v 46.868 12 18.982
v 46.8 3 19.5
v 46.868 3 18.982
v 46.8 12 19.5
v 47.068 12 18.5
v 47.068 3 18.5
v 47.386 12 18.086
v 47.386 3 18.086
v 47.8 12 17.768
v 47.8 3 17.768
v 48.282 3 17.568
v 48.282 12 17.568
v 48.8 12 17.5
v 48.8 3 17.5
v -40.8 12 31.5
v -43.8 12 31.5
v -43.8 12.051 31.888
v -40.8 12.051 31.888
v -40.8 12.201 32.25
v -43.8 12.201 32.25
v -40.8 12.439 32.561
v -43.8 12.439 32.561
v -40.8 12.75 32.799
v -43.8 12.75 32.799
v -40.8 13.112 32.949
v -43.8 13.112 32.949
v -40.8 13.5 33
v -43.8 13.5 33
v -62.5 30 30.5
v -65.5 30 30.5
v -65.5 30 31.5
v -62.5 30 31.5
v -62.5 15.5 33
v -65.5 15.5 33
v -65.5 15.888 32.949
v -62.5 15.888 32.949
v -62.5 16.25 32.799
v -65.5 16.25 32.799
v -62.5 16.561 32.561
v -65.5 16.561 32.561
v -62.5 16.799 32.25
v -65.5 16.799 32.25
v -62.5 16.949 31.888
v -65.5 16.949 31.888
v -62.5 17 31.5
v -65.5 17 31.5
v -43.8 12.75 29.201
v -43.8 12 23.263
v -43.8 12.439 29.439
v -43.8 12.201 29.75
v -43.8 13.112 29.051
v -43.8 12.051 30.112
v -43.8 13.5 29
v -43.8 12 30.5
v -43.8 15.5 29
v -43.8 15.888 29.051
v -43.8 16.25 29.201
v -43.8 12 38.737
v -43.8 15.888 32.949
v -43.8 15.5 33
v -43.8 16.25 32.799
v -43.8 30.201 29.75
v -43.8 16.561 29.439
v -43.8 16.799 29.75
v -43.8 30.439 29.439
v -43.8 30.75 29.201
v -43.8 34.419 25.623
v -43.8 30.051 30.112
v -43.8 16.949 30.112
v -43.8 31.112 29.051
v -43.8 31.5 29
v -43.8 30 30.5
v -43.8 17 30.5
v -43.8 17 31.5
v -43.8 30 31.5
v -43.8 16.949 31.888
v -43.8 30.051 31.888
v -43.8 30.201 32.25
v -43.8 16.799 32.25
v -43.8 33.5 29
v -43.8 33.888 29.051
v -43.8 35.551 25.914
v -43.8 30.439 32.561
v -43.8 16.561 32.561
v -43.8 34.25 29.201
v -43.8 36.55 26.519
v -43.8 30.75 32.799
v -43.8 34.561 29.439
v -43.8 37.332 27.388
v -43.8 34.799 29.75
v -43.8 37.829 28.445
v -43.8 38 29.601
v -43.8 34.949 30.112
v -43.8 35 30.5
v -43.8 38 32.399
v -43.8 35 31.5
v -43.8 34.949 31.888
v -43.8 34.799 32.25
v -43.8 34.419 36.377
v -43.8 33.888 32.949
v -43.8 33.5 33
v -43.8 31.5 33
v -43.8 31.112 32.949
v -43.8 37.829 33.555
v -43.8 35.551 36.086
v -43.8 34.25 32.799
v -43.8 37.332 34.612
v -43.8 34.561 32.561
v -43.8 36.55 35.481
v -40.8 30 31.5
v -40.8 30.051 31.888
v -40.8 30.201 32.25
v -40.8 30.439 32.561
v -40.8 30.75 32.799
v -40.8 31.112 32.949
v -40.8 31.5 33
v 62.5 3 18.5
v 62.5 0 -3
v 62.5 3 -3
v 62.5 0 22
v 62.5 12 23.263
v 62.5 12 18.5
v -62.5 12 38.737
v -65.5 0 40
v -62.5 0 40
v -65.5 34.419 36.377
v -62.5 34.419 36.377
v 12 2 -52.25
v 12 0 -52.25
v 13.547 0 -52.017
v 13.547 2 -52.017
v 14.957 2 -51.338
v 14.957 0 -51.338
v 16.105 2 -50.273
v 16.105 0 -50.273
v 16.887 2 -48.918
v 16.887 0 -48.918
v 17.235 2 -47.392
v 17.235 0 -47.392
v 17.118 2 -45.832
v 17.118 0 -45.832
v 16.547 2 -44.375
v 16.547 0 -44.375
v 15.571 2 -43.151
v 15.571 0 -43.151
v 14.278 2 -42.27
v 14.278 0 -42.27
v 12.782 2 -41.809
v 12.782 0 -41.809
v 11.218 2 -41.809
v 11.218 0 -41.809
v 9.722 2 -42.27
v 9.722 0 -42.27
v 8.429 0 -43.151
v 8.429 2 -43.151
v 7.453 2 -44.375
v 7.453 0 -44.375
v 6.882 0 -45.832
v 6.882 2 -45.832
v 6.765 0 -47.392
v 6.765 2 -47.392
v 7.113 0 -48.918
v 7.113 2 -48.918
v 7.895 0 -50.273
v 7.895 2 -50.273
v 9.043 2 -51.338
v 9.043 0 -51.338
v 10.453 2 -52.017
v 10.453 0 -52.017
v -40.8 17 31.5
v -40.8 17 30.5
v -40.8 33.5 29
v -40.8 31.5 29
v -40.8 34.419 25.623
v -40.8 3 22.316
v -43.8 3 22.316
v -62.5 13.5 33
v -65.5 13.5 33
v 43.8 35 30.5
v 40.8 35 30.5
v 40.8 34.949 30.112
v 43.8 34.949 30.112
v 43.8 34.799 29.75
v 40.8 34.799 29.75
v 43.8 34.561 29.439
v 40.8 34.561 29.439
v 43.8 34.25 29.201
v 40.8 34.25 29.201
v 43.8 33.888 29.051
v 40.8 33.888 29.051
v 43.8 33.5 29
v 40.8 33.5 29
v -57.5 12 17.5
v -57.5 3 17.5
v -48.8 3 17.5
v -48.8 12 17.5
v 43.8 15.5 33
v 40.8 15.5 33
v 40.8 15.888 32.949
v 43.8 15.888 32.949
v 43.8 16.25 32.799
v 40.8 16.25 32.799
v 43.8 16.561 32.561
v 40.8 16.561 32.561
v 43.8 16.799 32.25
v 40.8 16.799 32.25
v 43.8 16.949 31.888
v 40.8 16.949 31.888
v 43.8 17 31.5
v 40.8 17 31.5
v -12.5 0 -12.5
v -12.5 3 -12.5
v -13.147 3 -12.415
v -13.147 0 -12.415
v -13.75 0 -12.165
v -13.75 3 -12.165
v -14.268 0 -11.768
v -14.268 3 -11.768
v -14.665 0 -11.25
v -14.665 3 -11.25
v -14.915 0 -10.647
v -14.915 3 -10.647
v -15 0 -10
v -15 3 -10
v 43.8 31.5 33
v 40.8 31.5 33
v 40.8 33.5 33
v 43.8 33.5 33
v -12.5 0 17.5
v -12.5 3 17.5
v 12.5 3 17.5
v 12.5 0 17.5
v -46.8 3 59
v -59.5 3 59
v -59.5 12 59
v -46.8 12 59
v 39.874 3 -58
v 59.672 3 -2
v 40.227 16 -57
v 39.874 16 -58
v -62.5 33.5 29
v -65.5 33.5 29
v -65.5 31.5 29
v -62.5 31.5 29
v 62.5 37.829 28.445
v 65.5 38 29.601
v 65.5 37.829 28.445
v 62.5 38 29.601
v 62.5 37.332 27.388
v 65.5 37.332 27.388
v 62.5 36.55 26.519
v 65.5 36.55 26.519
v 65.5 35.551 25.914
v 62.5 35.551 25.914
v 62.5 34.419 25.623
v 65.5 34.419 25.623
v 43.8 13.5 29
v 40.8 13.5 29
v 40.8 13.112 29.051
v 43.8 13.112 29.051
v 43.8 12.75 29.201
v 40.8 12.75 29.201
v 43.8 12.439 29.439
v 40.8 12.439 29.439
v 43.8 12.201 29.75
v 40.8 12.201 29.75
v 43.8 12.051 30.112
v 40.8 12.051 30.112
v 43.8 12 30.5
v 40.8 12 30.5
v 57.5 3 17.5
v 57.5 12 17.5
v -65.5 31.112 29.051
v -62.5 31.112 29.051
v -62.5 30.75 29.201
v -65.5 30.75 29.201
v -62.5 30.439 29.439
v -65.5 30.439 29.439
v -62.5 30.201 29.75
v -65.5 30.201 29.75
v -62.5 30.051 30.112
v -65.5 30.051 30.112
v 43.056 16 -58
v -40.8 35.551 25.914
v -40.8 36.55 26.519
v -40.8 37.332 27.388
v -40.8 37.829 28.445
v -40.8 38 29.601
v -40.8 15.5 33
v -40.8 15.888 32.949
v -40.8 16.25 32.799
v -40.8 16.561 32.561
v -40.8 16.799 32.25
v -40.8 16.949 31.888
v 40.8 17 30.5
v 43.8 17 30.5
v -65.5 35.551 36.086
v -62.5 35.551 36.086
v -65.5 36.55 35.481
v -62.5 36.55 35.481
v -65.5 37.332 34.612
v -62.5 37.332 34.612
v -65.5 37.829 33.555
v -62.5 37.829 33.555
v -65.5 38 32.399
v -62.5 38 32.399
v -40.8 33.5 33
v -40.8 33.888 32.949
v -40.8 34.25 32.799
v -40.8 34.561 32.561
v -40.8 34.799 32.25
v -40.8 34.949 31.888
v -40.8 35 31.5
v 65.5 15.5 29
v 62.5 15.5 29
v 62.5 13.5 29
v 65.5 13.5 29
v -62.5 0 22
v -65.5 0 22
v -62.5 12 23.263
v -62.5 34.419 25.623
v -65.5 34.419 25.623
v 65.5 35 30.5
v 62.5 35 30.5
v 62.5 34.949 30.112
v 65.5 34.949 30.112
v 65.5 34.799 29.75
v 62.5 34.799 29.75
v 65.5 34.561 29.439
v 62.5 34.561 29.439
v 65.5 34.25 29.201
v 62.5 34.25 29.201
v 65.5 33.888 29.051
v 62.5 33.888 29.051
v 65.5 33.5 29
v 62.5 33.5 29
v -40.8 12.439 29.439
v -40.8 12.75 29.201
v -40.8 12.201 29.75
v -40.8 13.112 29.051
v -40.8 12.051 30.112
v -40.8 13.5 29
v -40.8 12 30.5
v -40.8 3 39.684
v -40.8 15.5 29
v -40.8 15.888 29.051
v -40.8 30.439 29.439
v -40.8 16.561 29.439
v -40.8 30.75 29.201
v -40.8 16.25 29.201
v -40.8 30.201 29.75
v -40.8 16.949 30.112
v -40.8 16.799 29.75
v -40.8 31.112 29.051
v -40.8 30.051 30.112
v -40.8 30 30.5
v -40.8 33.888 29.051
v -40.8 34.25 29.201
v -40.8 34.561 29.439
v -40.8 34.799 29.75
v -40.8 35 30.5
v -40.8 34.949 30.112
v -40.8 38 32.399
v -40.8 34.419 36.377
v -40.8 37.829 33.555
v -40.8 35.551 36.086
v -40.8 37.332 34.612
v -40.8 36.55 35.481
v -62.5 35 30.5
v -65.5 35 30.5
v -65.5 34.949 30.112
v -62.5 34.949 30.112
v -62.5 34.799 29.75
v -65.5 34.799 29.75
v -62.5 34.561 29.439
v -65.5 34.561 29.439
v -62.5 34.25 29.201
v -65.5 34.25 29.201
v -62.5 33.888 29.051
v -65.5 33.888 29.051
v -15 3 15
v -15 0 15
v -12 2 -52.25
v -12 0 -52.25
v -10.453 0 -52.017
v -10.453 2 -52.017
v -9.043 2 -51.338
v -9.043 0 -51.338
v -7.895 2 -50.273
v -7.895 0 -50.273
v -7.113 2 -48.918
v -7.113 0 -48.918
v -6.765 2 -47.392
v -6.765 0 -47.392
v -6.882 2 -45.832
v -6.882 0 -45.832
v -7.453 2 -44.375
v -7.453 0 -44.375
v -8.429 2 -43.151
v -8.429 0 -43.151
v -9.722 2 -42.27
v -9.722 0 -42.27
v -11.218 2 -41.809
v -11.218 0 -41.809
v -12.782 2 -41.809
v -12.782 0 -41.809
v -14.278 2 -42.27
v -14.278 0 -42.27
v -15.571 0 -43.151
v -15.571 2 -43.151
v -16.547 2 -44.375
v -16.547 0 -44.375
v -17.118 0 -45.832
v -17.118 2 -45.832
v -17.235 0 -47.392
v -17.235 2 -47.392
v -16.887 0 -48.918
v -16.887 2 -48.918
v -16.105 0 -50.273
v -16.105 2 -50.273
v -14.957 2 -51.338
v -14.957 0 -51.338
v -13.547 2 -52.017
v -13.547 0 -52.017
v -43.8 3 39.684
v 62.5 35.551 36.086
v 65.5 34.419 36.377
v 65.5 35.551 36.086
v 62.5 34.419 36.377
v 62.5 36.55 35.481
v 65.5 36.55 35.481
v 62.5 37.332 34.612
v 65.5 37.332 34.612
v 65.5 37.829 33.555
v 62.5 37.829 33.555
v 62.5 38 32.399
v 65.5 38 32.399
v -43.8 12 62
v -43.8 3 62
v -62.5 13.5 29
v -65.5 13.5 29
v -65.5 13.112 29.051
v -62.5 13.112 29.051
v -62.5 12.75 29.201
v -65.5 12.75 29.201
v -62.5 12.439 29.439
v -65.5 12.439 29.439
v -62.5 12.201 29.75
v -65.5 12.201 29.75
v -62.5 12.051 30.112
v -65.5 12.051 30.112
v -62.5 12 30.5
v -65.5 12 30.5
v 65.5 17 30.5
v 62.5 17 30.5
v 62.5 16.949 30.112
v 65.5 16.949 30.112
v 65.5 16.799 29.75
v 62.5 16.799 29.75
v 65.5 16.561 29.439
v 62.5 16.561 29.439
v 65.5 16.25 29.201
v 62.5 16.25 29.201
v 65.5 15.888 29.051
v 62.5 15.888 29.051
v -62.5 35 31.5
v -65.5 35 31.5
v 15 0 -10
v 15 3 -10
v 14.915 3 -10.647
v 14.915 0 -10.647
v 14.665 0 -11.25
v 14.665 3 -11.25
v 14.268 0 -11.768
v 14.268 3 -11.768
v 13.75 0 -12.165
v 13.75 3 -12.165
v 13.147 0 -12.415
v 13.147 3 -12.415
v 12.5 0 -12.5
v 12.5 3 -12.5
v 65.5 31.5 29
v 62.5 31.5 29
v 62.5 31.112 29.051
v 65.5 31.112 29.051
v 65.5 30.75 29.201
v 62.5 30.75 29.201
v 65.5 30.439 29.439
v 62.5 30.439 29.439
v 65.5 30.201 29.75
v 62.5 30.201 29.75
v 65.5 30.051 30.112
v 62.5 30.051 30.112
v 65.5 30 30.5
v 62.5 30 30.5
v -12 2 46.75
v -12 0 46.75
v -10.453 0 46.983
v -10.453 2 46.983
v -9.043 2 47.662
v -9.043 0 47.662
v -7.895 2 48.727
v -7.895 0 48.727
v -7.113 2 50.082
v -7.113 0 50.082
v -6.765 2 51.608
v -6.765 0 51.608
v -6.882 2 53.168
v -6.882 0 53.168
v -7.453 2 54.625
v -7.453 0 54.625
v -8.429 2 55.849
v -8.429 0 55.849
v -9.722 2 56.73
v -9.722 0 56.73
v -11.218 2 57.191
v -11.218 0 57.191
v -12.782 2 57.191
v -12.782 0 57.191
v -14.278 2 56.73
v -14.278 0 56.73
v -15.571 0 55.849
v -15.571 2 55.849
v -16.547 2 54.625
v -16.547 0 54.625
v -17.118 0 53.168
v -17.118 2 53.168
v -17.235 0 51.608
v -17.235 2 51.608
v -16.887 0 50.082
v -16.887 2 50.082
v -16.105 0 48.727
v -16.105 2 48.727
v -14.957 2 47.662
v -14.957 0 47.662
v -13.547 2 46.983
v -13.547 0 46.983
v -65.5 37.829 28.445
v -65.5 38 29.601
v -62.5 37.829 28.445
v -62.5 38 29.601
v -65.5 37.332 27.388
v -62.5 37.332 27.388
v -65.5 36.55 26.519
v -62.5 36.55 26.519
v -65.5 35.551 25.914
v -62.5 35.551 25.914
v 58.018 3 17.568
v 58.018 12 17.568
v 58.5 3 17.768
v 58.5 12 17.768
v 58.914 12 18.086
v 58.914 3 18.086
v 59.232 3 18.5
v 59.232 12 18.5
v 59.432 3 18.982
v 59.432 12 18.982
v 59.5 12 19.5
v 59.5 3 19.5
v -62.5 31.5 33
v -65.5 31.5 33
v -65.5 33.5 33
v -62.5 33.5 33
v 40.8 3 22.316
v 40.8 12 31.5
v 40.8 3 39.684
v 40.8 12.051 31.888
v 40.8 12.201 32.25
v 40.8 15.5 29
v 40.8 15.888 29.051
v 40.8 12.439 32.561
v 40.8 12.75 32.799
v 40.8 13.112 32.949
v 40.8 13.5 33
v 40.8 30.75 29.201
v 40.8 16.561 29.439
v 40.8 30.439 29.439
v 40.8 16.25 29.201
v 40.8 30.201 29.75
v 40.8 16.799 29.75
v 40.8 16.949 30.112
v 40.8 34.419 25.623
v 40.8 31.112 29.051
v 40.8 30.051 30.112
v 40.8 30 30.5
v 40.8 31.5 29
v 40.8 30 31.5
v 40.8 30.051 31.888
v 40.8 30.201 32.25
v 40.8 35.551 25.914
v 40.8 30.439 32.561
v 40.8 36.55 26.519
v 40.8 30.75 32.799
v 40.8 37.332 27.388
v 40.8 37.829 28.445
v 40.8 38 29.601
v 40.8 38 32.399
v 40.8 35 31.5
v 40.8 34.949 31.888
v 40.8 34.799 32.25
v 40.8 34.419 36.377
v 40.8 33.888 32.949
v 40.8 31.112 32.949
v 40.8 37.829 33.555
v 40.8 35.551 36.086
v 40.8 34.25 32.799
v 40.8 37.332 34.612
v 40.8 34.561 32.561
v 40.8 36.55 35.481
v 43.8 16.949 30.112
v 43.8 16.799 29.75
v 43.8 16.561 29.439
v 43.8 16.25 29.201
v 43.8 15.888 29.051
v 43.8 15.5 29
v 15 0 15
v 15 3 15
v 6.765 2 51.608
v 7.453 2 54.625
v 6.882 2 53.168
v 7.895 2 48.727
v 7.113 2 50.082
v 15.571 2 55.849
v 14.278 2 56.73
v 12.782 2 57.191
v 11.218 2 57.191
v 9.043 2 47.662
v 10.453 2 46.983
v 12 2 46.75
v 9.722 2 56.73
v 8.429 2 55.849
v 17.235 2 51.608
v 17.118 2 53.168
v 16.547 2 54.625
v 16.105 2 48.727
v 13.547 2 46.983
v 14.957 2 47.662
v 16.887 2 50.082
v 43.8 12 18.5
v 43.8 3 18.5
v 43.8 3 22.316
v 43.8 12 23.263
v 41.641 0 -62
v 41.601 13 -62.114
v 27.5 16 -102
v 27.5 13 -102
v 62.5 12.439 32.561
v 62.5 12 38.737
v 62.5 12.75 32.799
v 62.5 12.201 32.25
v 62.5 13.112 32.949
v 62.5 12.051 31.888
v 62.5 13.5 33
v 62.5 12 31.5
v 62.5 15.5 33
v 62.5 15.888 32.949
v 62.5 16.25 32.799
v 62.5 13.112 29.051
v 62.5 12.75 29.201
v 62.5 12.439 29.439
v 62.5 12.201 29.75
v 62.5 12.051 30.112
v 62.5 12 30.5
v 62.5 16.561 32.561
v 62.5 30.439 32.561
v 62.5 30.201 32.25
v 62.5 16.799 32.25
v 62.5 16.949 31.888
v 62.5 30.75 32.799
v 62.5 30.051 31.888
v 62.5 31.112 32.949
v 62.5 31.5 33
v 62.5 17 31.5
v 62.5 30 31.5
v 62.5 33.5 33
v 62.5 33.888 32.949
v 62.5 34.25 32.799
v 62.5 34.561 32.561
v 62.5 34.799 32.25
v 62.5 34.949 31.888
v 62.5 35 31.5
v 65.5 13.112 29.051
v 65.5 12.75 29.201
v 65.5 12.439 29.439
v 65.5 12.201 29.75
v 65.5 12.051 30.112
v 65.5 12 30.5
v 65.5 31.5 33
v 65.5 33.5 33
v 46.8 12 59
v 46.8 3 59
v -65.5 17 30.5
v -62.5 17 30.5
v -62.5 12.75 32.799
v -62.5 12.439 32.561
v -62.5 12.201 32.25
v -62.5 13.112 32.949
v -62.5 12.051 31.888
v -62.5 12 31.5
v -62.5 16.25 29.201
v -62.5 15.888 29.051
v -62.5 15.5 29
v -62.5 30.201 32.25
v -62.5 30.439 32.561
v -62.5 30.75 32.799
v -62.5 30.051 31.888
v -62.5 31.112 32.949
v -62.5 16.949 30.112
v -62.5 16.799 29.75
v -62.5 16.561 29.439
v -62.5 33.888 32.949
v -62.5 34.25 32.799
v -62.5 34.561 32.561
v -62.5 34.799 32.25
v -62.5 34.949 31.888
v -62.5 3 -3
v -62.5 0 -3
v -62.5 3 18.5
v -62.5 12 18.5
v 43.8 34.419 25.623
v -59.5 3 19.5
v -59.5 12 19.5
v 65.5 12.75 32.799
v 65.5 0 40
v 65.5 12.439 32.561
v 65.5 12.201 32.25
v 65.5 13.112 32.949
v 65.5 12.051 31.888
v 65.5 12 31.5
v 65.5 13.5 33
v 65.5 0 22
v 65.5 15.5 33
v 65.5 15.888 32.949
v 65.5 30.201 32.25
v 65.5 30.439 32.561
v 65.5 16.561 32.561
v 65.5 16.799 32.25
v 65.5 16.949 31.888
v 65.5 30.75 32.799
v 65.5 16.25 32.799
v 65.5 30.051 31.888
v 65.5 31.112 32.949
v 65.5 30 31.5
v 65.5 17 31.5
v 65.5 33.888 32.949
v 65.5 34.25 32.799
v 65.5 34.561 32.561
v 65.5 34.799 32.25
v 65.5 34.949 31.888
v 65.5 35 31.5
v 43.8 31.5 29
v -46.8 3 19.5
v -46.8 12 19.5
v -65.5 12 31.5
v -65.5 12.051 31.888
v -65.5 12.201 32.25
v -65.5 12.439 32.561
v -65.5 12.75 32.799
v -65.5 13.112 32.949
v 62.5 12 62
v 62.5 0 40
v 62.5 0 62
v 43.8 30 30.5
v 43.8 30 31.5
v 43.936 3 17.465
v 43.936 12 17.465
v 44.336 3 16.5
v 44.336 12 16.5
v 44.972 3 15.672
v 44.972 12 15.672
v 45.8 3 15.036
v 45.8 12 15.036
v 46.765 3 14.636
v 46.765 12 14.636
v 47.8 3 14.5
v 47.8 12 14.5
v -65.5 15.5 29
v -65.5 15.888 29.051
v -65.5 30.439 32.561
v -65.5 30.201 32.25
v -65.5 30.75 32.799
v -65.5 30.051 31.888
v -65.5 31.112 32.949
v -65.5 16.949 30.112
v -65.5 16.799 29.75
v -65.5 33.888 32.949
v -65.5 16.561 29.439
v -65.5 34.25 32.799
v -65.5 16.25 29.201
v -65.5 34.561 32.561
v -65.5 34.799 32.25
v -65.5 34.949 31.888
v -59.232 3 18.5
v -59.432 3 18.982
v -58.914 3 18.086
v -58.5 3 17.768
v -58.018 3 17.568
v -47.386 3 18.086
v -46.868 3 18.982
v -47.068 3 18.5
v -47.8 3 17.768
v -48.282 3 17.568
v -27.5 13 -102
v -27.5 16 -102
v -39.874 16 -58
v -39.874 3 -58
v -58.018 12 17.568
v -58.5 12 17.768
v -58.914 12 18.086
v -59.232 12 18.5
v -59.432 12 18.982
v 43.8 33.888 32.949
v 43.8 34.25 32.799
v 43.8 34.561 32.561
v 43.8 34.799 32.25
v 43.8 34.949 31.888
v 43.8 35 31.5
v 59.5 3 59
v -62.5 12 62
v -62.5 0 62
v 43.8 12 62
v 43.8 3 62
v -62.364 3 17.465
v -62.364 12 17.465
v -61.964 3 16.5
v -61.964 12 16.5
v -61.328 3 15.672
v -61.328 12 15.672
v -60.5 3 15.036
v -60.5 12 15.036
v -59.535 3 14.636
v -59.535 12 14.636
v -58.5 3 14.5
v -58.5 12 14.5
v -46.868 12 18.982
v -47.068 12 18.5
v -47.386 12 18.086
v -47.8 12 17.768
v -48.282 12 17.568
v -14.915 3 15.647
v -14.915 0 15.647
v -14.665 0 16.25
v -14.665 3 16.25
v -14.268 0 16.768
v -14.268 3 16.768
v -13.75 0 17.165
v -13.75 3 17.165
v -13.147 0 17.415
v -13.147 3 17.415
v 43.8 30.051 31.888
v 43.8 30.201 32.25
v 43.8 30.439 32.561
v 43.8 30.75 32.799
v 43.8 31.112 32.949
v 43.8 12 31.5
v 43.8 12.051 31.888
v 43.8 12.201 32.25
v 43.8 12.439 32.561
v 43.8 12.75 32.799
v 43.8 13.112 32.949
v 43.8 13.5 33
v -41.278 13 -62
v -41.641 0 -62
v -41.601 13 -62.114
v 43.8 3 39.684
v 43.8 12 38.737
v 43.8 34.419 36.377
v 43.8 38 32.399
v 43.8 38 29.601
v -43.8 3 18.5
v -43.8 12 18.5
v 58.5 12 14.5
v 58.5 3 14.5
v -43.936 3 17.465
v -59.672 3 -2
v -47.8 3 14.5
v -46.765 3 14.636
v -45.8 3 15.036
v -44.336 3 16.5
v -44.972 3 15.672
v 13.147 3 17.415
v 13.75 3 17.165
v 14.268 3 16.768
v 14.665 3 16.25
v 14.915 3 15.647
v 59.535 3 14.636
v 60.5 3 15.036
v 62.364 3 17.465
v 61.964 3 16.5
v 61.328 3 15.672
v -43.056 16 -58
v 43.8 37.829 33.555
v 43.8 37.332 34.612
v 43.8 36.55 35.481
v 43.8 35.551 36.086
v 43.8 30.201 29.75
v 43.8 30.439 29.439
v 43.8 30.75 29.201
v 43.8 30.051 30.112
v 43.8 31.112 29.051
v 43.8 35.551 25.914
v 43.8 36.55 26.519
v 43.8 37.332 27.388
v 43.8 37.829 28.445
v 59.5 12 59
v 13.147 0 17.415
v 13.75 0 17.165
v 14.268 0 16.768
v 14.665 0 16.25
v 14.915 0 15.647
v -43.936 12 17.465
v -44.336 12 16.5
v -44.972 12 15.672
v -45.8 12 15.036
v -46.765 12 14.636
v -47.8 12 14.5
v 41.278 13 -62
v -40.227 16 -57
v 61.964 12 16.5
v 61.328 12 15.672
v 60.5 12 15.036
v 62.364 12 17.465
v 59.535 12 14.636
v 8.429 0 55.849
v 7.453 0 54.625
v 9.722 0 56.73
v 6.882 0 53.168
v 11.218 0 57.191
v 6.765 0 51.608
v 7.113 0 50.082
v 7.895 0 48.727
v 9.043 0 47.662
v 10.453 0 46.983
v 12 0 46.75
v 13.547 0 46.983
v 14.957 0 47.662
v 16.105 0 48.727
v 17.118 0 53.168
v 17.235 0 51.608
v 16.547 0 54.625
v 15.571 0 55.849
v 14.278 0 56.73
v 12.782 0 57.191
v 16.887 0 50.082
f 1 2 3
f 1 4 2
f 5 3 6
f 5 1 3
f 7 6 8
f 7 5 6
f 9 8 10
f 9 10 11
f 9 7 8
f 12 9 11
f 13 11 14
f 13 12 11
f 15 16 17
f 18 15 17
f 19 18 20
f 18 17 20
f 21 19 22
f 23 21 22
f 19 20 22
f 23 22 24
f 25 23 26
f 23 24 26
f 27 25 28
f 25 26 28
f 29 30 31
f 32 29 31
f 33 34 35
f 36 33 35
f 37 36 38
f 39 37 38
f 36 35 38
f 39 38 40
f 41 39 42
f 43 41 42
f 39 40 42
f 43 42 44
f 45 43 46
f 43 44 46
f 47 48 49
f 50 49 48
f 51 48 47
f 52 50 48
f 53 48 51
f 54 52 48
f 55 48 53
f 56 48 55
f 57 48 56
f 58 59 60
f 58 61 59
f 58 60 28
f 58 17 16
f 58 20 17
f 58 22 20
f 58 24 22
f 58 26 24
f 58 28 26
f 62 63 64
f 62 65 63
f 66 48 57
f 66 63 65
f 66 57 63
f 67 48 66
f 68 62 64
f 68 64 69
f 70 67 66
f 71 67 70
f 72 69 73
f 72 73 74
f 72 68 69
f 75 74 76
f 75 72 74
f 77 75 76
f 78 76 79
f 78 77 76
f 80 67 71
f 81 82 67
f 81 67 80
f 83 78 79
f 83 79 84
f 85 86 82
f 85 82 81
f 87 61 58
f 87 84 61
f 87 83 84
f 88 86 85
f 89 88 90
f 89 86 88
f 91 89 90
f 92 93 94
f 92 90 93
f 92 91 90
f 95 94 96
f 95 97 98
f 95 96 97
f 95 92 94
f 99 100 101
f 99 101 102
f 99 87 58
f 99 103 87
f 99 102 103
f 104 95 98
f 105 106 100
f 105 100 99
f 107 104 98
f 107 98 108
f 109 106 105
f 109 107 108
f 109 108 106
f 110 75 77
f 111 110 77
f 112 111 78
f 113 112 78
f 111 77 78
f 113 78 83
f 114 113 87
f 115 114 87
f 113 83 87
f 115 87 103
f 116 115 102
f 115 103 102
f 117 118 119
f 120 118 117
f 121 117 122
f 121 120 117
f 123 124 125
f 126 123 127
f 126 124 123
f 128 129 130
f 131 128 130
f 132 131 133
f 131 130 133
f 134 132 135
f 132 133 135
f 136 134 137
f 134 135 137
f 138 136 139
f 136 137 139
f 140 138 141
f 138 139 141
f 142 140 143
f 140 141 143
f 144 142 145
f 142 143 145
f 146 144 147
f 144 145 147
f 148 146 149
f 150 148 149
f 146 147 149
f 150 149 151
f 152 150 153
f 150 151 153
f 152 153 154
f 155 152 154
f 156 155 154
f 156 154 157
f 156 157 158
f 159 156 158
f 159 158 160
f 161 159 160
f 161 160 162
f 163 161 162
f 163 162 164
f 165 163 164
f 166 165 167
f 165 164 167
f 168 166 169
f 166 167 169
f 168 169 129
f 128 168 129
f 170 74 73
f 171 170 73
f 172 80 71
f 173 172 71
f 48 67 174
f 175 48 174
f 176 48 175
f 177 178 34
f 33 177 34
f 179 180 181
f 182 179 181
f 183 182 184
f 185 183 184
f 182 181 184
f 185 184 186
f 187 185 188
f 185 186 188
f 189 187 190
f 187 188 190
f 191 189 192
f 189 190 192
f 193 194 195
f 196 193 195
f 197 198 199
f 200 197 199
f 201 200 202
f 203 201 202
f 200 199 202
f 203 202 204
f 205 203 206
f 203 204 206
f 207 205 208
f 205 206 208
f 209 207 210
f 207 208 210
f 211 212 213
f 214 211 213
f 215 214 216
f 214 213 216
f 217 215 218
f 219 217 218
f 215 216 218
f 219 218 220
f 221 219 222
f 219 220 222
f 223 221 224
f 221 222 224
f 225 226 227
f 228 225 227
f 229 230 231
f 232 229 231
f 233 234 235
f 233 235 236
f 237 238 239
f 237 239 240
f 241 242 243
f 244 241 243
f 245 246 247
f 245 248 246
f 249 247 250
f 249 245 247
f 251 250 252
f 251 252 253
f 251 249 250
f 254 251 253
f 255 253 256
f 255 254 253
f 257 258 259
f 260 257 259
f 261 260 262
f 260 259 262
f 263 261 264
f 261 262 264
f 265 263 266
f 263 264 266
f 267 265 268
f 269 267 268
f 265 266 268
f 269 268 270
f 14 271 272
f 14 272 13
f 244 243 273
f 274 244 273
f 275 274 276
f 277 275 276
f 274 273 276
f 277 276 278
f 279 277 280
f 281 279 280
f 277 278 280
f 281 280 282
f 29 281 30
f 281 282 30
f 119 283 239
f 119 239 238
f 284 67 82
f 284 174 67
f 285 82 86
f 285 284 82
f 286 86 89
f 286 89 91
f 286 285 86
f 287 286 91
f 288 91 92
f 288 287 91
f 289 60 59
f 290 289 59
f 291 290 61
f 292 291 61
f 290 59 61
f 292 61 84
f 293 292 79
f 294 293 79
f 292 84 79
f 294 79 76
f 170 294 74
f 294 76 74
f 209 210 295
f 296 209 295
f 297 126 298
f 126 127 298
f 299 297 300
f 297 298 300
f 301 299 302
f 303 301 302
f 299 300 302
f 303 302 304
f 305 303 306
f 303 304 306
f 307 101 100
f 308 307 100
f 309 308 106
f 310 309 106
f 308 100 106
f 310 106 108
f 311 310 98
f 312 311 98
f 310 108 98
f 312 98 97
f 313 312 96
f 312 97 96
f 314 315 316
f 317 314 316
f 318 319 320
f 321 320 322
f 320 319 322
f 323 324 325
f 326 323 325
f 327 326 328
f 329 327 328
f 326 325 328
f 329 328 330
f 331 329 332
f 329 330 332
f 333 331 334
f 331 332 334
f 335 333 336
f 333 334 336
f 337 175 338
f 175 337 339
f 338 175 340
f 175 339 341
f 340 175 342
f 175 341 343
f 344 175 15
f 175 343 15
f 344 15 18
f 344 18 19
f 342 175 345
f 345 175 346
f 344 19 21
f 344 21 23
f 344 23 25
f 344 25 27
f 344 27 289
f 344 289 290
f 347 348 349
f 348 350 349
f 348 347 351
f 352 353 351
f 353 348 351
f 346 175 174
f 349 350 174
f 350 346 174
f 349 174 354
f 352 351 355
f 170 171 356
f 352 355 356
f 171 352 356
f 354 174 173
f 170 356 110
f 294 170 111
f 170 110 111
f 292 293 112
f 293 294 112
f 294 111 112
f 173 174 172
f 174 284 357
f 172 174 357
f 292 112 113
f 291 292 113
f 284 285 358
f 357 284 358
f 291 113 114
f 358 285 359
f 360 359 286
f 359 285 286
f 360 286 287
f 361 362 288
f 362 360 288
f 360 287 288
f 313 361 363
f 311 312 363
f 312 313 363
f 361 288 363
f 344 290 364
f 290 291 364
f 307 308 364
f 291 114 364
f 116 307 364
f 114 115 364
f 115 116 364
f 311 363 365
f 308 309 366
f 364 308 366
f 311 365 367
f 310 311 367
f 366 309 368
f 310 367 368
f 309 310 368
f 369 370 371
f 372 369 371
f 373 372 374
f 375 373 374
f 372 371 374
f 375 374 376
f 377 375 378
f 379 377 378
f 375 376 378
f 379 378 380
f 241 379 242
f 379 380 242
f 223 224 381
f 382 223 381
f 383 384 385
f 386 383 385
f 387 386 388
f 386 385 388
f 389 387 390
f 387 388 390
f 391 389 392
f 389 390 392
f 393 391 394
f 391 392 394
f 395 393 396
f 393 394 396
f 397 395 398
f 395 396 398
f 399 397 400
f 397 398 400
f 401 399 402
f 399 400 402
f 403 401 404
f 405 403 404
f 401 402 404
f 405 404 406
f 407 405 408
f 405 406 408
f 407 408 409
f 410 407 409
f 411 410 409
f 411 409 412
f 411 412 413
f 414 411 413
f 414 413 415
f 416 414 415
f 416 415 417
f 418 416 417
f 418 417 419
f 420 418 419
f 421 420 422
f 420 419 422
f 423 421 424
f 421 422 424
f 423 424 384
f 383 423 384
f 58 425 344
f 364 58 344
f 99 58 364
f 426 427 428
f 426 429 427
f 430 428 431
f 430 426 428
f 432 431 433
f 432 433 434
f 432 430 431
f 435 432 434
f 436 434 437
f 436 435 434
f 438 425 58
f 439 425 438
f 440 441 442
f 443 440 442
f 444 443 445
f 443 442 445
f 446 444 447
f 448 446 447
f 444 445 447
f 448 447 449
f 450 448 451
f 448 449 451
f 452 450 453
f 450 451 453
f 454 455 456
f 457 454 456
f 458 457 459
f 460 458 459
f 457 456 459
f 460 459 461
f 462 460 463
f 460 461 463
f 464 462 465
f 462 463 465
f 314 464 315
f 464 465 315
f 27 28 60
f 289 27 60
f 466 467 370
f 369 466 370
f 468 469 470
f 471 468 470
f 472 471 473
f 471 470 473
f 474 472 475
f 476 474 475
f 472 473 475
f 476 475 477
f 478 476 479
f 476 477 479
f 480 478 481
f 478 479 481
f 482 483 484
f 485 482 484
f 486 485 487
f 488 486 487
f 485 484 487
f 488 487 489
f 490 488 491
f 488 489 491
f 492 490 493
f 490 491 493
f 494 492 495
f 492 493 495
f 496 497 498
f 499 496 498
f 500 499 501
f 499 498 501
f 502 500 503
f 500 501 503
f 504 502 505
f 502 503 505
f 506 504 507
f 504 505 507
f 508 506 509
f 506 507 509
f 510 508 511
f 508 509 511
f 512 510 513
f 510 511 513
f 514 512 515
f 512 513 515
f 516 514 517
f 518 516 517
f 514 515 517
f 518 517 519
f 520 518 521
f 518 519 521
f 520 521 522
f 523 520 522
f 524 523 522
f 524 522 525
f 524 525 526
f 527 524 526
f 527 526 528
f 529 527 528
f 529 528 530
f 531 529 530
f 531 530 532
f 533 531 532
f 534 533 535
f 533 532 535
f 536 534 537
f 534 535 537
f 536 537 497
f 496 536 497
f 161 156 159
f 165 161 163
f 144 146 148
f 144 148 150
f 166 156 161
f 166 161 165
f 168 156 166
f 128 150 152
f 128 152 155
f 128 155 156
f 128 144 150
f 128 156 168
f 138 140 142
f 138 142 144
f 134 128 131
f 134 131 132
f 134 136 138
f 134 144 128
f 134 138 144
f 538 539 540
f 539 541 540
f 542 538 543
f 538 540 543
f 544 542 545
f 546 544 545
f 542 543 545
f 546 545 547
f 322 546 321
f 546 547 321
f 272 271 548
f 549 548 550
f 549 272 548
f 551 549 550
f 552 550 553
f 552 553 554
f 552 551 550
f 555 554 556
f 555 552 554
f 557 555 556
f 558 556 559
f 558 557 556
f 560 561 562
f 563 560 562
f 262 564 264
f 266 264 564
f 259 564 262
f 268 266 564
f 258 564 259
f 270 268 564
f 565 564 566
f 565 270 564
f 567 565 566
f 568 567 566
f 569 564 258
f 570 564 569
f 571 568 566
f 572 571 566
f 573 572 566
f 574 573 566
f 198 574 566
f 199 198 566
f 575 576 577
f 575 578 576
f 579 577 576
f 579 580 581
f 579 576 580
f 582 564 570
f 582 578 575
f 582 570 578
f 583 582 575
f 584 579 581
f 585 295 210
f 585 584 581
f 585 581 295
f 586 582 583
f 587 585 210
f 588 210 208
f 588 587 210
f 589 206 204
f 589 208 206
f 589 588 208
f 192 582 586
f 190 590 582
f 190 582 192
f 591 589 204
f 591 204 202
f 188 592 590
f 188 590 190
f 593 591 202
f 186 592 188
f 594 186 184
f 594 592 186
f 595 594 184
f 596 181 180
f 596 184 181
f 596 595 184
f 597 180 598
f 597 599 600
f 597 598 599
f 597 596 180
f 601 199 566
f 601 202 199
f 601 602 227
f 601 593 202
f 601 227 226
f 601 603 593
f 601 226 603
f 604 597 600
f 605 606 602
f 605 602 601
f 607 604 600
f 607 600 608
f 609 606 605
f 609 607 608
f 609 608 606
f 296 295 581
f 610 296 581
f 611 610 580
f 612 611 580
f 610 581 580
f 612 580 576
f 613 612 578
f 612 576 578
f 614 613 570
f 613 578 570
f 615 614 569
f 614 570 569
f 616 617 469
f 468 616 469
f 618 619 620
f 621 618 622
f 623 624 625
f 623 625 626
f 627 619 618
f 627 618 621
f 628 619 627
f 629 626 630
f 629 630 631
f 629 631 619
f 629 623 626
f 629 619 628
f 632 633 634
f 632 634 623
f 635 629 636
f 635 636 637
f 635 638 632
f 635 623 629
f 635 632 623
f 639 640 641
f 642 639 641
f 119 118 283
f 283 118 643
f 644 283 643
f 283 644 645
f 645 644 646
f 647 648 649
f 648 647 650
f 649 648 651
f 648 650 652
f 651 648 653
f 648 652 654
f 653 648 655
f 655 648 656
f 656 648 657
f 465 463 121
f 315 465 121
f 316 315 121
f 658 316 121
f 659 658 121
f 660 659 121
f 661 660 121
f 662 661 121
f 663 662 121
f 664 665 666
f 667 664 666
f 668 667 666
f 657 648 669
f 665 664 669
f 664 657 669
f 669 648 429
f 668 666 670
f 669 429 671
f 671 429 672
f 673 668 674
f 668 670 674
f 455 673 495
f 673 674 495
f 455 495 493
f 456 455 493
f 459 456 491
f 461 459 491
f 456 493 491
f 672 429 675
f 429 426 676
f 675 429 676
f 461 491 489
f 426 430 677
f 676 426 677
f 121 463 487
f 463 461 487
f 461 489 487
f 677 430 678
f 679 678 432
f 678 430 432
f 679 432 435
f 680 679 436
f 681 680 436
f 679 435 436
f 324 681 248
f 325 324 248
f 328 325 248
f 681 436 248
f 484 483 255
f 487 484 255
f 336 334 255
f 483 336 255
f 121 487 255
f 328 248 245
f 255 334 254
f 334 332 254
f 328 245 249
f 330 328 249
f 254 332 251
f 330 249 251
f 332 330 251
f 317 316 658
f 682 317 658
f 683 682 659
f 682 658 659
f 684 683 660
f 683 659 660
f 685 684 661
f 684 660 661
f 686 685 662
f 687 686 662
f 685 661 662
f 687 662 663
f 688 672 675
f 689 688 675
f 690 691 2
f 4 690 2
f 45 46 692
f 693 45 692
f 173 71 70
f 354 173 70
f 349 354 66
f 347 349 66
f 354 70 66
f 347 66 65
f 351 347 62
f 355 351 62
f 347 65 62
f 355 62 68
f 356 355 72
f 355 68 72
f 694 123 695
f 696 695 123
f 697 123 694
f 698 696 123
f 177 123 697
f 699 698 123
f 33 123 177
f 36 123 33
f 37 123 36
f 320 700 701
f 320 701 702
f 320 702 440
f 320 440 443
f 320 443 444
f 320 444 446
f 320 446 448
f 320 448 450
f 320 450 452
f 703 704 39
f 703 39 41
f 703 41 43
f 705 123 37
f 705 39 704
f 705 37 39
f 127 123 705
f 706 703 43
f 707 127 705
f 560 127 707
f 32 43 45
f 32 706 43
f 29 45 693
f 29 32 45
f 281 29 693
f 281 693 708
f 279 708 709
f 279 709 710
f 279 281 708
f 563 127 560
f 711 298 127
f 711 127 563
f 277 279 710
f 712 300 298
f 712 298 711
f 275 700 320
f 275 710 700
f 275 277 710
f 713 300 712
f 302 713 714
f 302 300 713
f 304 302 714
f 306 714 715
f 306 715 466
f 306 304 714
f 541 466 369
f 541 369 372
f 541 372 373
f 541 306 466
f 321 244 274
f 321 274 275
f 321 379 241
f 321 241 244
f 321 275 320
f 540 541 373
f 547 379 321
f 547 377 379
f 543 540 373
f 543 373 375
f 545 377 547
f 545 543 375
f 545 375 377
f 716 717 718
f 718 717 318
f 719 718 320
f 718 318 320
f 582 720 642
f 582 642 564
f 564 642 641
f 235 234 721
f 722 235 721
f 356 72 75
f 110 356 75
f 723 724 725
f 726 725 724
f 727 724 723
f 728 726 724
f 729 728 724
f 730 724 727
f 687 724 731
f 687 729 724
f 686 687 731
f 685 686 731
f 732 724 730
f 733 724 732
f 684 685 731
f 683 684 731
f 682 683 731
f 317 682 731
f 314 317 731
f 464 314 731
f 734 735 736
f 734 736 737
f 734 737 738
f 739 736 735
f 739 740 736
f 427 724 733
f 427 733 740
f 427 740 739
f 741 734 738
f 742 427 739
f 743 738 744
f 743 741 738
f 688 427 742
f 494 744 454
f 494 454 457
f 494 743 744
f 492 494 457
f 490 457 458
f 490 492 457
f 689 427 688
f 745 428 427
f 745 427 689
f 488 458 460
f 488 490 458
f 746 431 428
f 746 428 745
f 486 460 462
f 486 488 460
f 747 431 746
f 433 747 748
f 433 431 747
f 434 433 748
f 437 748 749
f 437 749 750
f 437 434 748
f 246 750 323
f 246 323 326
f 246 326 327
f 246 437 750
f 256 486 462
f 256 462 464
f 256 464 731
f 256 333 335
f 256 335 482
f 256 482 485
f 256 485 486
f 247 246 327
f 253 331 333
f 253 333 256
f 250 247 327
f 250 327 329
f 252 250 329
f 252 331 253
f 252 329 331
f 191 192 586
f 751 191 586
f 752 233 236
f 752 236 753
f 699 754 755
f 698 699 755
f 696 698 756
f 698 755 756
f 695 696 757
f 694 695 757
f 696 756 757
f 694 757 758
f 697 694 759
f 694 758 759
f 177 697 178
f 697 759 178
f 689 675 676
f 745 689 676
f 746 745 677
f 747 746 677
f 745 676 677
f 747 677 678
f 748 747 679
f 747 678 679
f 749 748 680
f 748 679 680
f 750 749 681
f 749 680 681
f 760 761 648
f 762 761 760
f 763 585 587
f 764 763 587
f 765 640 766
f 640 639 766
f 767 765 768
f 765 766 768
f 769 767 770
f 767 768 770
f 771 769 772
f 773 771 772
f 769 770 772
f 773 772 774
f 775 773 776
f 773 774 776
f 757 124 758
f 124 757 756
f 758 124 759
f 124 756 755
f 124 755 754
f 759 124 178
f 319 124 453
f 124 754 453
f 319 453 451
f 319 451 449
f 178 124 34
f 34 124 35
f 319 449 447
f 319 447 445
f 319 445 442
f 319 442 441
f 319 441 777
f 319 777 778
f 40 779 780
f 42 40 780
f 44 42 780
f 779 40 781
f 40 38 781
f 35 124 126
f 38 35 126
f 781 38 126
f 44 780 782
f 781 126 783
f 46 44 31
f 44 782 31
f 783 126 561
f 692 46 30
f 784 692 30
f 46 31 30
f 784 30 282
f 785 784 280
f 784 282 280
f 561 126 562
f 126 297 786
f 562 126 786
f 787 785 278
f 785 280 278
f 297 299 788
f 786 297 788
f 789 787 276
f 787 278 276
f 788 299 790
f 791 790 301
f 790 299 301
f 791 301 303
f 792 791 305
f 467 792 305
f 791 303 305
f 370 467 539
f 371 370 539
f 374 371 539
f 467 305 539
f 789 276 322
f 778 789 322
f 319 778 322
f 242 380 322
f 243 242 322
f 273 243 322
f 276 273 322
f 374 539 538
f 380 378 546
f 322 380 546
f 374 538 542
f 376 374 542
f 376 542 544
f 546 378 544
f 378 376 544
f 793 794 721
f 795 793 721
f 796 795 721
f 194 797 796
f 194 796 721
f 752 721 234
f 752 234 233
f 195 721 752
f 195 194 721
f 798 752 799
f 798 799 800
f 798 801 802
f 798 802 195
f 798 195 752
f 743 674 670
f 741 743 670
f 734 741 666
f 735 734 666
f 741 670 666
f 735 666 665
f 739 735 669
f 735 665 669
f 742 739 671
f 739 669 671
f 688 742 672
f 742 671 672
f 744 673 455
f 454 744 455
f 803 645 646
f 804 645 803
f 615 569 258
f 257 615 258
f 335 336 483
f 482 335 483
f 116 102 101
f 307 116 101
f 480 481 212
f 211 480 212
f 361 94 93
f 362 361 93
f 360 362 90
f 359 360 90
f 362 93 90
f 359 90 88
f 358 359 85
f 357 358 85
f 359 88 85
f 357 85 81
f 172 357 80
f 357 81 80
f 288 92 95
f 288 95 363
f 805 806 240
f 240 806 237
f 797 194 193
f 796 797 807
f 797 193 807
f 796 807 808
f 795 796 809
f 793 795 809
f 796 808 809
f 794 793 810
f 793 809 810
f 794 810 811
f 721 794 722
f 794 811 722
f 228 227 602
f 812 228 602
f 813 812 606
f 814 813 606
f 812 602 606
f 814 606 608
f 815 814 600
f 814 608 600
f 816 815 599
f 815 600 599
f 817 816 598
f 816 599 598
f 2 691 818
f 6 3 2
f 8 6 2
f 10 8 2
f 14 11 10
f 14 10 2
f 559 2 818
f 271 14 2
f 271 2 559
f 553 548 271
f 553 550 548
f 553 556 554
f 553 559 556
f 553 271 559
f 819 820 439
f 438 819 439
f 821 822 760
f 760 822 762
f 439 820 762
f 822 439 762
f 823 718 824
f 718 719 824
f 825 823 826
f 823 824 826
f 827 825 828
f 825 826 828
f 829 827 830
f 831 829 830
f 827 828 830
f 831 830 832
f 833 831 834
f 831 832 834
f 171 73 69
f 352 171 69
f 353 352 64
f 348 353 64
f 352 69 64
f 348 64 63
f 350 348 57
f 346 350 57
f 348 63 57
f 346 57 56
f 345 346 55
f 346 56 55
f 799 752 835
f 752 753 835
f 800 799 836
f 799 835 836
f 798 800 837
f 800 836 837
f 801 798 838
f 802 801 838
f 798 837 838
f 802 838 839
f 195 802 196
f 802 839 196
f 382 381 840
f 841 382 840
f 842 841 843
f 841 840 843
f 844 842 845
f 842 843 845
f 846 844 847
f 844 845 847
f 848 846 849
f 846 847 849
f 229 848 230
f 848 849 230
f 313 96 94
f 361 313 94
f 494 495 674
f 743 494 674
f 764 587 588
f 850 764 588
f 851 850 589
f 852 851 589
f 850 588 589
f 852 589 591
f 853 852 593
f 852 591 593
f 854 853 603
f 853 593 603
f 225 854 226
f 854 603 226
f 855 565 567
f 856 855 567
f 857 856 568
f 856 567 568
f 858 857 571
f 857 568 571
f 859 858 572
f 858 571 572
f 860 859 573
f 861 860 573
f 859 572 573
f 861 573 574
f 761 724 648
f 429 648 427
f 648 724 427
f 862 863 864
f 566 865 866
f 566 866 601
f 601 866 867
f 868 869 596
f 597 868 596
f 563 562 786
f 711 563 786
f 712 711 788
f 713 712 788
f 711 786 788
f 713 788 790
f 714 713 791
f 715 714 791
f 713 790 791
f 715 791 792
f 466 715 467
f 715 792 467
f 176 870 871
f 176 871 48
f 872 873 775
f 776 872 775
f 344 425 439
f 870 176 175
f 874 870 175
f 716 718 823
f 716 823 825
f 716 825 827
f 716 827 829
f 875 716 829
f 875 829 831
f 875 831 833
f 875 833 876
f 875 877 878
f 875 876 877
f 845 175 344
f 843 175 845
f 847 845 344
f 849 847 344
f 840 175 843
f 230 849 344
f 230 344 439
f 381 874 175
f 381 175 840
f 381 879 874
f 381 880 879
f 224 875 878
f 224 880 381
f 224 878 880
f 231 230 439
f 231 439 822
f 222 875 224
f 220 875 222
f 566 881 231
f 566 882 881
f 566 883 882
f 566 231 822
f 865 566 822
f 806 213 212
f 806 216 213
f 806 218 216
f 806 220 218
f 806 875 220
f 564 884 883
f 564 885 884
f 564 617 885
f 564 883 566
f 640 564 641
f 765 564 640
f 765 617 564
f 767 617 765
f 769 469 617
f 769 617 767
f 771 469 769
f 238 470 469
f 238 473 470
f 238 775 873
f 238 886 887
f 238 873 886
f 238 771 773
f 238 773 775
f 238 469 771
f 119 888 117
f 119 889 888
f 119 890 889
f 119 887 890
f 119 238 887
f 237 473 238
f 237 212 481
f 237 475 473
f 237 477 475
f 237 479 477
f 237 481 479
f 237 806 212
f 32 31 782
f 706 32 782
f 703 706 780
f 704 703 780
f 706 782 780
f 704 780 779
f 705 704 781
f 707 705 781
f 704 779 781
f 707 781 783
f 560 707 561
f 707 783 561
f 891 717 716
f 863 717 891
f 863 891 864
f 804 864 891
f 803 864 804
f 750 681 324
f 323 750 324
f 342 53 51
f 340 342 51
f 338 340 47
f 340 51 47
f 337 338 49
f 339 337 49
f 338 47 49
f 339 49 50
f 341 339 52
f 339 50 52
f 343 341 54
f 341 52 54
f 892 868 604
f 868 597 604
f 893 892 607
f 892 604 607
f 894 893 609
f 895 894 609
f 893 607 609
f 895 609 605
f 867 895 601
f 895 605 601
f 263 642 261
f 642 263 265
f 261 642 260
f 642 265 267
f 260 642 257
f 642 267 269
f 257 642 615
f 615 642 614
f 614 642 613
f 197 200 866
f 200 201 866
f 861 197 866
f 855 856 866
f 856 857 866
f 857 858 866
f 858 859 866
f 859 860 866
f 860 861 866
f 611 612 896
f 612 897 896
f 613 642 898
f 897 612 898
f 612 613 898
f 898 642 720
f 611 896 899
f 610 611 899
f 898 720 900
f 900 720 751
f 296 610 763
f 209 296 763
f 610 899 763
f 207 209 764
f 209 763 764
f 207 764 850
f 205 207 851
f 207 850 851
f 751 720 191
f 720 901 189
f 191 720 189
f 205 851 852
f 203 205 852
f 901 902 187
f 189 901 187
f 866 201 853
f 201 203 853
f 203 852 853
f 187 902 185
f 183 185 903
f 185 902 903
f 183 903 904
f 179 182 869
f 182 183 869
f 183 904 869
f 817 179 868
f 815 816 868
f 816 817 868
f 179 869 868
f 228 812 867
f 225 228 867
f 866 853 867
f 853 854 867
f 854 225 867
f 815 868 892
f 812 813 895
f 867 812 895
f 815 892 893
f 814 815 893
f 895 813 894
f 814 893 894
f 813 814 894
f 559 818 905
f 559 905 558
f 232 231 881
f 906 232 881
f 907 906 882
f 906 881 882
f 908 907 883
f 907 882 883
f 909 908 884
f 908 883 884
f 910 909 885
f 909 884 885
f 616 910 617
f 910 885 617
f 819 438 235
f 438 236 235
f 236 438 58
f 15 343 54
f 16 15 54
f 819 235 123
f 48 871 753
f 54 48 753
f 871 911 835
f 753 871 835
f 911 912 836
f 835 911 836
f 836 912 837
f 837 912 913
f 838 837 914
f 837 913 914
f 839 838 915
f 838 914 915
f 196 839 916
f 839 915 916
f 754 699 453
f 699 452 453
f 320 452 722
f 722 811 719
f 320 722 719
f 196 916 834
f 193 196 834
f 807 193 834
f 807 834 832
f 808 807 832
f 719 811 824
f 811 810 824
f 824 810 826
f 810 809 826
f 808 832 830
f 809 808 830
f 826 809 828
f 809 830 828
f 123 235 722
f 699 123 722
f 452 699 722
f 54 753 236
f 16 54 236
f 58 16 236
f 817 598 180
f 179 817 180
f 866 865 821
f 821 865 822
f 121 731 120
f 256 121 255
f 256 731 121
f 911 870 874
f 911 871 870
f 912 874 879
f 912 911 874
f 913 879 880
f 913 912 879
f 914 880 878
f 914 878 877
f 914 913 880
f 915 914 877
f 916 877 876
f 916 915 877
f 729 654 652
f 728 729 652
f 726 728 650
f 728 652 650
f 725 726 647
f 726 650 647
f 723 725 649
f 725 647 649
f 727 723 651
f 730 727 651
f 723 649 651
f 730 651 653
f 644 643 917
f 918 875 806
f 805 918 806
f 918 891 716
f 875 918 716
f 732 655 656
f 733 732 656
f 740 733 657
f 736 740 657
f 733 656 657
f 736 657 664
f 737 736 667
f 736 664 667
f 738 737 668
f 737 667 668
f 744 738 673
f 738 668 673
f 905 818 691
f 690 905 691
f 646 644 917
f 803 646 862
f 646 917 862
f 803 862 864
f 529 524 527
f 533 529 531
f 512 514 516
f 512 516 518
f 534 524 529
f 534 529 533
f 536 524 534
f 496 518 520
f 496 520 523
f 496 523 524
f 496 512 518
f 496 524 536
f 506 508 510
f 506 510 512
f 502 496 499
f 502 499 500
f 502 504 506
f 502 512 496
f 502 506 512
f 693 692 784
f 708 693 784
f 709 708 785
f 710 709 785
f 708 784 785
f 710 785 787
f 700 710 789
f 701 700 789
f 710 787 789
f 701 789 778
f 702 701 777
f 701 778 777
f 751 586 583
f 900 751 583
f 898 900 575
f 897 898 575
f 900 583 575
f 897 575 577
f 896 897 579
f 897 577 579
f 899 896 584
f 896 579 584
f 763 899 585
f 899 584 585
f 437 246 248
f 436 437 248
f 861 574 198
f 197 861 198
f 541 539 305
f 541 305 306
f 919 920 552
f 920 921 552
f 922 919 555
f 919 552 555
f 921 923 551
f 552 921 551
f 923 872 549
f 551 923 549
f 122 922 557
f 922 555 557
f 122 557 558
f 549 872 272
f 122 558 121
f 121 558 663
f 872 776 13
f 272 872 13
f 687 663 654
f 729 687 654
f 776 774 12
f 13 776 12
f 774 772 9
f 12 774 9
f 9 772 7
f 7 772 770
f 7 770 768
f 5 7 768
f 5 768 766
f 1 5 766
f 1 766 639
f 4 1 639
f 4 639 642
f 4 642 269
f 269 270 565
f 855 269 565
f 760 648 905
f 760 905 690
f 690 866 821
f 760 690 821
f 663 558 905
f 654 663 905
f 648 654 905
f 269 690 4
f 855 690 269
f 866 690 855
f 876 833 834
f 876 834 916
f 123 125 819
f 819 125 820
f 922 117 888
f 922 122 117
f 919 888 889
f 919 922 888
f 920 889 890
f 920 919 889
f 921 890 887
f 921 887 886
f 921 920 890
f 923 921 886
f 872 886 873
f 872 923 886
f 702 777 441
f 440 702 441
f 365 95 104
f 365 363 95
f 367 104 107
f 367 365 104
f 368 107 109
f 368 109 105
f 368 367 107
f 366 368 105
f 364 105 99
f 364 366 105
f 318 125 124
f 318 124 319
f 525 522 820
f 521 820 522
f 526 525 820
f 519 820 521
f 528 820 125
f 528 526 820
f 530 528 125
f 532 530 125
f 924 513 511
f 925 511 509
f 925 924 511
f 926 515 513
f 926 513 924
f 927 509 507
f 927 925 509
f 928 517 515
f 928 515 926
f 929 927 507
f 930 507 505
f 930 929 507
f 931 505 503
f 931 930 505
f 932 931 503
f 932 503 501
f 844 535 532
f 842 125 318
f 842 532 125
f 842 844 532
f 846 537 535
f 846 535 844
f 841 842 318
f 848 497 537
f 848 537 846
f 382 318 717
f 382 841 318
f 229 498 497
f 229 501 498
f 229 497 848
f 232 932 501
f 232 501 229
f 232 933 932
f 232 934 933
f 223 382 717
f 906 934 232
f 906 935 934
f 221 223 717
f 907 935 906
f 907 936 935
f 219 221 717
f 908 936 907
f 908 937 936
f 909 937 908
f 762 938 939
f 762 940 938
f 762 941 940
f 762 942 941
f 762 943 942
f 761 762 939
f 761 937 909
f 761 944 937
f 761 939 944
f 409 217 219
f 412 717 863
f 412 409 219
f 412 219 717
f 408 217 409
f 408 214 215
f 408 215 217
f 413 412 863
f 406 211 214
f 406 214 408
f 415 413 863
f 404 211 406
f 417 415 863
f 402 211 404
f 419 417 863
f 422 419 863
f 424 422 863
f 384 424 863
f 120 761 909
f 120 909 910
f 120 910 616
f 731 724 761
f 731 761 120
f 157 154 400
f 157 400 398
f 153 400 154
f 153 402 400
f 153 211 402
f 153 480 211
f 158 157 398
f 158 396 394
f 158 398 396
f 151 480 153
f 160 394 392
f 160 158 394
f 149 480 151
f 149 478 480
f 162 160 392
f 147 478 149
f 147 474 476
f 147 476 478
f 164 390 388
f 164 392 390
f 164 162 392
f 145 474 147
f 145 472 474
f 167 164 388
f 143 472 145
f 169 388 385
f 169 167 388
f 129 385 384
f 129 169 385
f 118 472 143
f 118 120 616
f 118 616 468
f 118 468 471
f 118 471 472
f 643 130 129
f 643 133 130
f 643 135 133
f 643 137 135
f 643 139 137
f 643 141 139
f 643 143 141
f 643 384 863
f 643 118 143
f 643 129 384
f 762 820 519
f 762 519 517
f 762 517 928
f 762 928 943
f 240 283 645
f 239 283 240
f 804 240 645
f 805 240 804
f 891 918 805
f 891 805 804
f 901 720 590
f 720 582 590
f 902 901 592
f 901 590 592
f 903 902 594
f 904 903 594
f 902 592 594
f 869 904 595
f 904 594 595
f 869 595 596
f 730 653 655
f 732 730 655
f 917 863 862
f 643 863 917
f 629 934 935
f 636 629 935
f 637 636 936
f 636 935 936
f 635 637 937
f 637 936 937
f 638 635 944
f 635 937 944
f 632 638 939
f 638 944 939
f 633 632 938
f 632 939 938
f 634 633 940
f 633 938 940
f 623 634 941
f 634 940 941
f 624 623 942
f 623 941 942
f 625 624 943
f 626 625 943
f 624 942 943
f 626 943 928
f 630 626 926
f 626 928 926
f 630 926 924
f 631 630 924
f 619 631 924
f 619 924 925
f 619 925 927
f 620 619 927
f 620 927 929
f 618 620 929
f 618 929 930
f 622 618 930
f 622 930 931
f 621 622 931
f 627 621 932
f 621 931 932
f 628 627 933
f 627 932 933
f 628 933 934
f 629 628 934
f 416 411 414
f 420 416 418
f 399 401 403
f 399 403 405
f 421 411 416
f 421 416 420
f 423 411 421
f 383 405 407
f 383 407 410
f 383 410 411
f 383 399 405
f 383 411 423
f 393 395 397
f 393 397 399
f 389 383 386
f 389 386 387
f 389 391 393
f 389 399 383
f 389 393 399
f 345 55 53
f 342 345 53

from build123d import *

# Parameters (mm, degrees)
ESBO_O1_W             = 125
ESBO_O1_H             = 124
EXTRUS_O1_DEPTH       = 3
ESBO_O2_W             = 12.7
ESBO_O2_H             = 41.5
EXTRUS_O2_DEPTH       = 9
FILETE1_R             = 4
FILETE2_R             = 2
FILETE3_R             = 4
FILETE4_R             = 2
EXTRUS_O4_START       = -3
ESBO_O3_W             = 3
ESBO_O3_H             = 10
EXTRUS_O4_DEPTH       = 38
EXTRUS_O5_DEPTH       = 150.829903557
EXTRUS_O6_DEPTH       = 150.829903557
EXTRUS_O7_DEPTH       = 3
EXTRUS_O8_DEPTH       = 3
FILETE5_R             = 4
FILETE6_R             = 4
EXTRUS_O9_DEPTH       = 3
ESBO_O10_W            = 125
ESBO_O10_H            = 4
EXTRUS_O10_DEPTH      = 13
ESBO_O11_W            = 125
ESBO_O11_H            = 3
EXTRUS_O11_DEPTH      = 40
EXTRUS_O12_DEPTH      = 40
EXTRUS_O12_DEPTH_BACK = 40
EXTRUS_O18_DEPTH      = 3
ESBO_O16_R            = 5.25
EXTRUS_O19_DEPTH      = 2


with BuildPart() as part:
    # Esboço1 → Extrusão1 (new body)
    with BuildSketch(Plane(origin=(0, 0, 0), x_dir=(1, 0, 0), z_dir=(0, 1, 0))):
        Rectangle(ESBO_O1_W, ESBO_O1_H)
    extrude(amount=EXTRUS_O1_DEPTH)

    # Esboço2 → Extrusão2 (add)
    with BuildSketch(Plane(origin=(0, 3, 0), x_dir=(1, 0, 0), z_dir=(0, 1, 0))):
        Polygon((-62.5, -26), (-62.5, -14.5), (-43.8, -14.5), (-43.8, -62), (-62.5, -62), (-62.5, -36), align=None)
        with Locations((-53.15, -38.25)):
            Rectangle(ESBO_O2_W, ESBO_O2_H, mode=Mode.SUBTRACT)
    extrus_o2 = extrude(amount=EXTRUS_O2_DEPTH)

    # Filete1
    filete1_edges = [part.edges().sort_by_distance(p)[0] for p in [
        (-62.5, 7.5, 14.5),
        (-43.8, 7.5, 14.5),
    ]]
    fillet(filete1_edges, radius=FILETE1_R)

    # Filete2
    filete2_edges = [part.edges().sort_by_distance(p)[0] for p in [
        (-46.8, 7.5, 17.5),
        (-59.5, 7.5, 17.5),
    ]]
    fillet(filete2_edges, radius=FILETE2_R)

    # Espelhar3: Extrusão2 across plane
    add(extrus_o2.mirror(Plane(origin=(0, 0, 0), x_dir=(0, 0, 1), z_dir=(1, 0, 0))))

    # Filete3
    filete3_edges = [part.edges().sort_by_distance(p)[0] for p in [
        (62.5, 7.5, 14.5),
        (43.8, 7.5, 14.5),
    ]]
    fillet(filete3_edges, radius=FILETE3_R)

    # Filete4
    filete4_edges = [part.edges().sort_by_distance(p)[0] for p in [
        (59.5, 7.5, 17.5),
        (46.8, 7.5, 17.5),
    ]]
    fillet(filete4_edges, radius=FILETE4_R)

    # Esboço3 → Extrusão4 (add)
    with BuildSketch(Plane(origin=(0, 3, 0), x_dir=(1, 0, 0), z_dir=(0, 1, 0)).offset(EXTRUS_O4_START)):
        with Locations((-64, -31)):
            Rectangle(ESBO_O3_W, ESBO_O3_H)
        with Locations((-42.3, -31)):
            Rectangle(ESBO_O3_W, ESBO_O3_H)
    extrus_o4 = extrude(amount=EXTRUS_O4_DEPTH)

    # Espelhar6: Extrusão4 across plane
    add(extrus_o4.mirror(Plane(origin=(0, 0, 0), x_dir=(0, 0, 1), z_dir=(1, 0, 0))))

    # Esboço5 → Extrusão5 (cut, through all)
    with BuildSketch(Plane.ZY.offset(65.5)):
        with BuildLine():
            Line((30.5, 12), (31.5, 12))
            ThreePointArc((31.5, 12), (32.560660172, 12.439339828), (33, 13.5))
            Line((33, 13.5), (33, 15.5))
            ThreePointArc((33, 15.5), (32.560660172, 16.560660172), (31.5, 17))
            Line((31.5, 17), (30.5, 17))
            ThreePointArc((30.5, 17), (29.439339828, 16.560660172), (29, 15.5))
            Line((29, 15.5), (29, 13.5))
            ThreePointArc((29, 13.5), (29.439339828, 12.439339828), (30.5, 12))
        make_face()
    extrude(amount=-EXTRUS_O5_DEPTH, mode=Mode.SUBTRACT)

    # Esboço6 → Extrusão6 (cut, through all)
    with BuildSketch(Plane.ZY.offset(65.5)):
        with BuildLine():
            Line((30.5, 30), (31.5, 30))
            ThreePointArc((31.5, 30), (32.560660172, 30.439339828), (33, 31.5))
            Line((33, 31.5), (33, 33.5))
            ThreePointArc((33, 33.5), (32.560660172, 34.560660172), (31.5, 35))
            Line((31.5, 35), (30.5, 35))
            ThreePointArc((30.5, 35), (29.439339828, 34.560660172), (29, 33.5))
            Line((29, 33.5), (29, 31.5))
            ThreePointArc((29, 31.5), (29.439339828, 30.439339828), (30.5, 30))
        make_face()
    extrude(amount=-EXTRUS_O6_DEPTH, mode=Mode.SUBTRACT)

    # Esboço7 → Extrusão7 (add)
    with BuildSketch(Plane.ZY.offset(65.5)):
        Polygon((26, 0), (22, 0), (26, 38), align=None)
        Polygon((36, 38), (36, 0), (40, 0), align=None)
    extrus_o7 = extrude(amount=-EXTRUS_O7_DEPTH)

    # Esboço8 → Extrusão8 (add)
    with BuildSketch(Plane.ZY.offset(43.8)):
        Polygon((26, 38), (22, 0), (26, 0), align=None)
        Polygon((36, 38), (36, 0), (40, 0), align=None)
    extrus_o8 = extrude(amount=-EXTRUS_O8_DEPTH)

    # Filete5
    filete5_edges = [part.edges().sort_by_distance(p)[0] for p in [
        (-64, 38, 26),
        (-64, 38, 36),
        (-42.3, 38, 36),
        (-42.3, 38, 26),
    ]]
    fillet(filete5_edges, radius=FILETE5_R)

    # Espelhar9: Extrusão7, Extrusão8 across plane
    add(extrus_o7.mirror(Plane(origin=(0, 0, 0), x_dir=(0, 0, 1), z_dir=(1, 0, 0))))
    add(extrus_o8.mirror(Plane(origin=(0, 0, 0), x_dir=(0, 0, 1), z_dir=(1, 0, 0))))

    # Filete6
    filete6_edges = [part.edges().sort_by_distance(p)[0] for p in [
        (64, 38, 26),
        (64, 38, 36),
        (42.3, 38, 36),
        (42.3, 38, 26),
    ]]
    fillet(filete6_edges, radius=FILETE6_R)

    # Esboço9 → Extrusão9 (cut)
    with BuildSketch(Plane(origin=(0, 3, 0), x_dir=(1, 0, 0), z_dir=(0, 1, 0))):
        with BuildLine():
            Line((-12.5, -17.5), (12.5, -17.5))
            ThreePointArc((12.5, -17.5), (14.267766953, -16.767766953), (15, -15))
            Line((15, -15), (15, 10))
            ThreePointArc((15, 10), (14.267766953, 11.767766953), (12.5, 12.5))
            Line((12.5, 12.5), (-12.5, 12.5))
            ThreePointArc((-12.5, 12.5), (-14.267766953, 11.767766953), (-15, 10))
            Line((-15, 10), (-15, -15))
            ThreePointArc((-15, -15), (-14.267766953, -16.767766953), (-12.5, -17.5))
        make_face()
    extrude(amount=-EXTRUS_O9_DEPTH, mode=Mode.SUBTRACT)

    # Esboço10 → Extrusão10 (add)
    with BuildSketch(Plane(origin=(0, 3, 0), x_dir=(1, 0, 0), z_dir=(0, 1, 0))):
        with Locations((0, 60)):
            Rectangle(ESBO_O10_W, ESBO_O10_H)
    extrude(amount=EXTRUS_O10_DEPTH)

    # Esboço11 → Extrusão11 (add)
    with BuildSketch(Plane(origin=(0, 0, -62), x_dir=(-1, 0, 0), z_dir=(0, 0, -1))):
        with Locations((0, 14.5)):
            Rectangle(ESBO_O11_W, ESBO_O11_H)
    extrude(amount=EXTRUS_O11_DEPTH)

    # Esboço13 → Extrusão12 (cut, two sides: drawn at the far end of the back side and taken through both)
    with BuildSketch(Plane(origin=(0, 3, 0), x_dir=(1, 0, 0), z_dir=(0, 1, 0)).offset(-EXTRUS_O12_DEPTH_BACK)):
        Polygon((-62.5, 3), (-27.5, 102), (-62.5, 102), align=None)
        Polygon((27.5, 102), (62.5, 102), (62.5, 3), align=None)
    extrude(amount=EXTRUS_O12_DEPTH + EXTRUS_O12_DEPTH_BACK, mode=Mode.SUBTRACT)

    # Esboço15 → Extrusão18 (add)
    with BuildSketch(Plane(origin=(56.498957011, 0, -19.974378741), x_dir=(-0.3333182172036595, 0, -0.9428143858046366), z_dir=(0.9428143858046366, 0, -0.3333182172036595))):
        Polygon((44.72381831, 16), (40.332033358, 16), (-18.003945418, 3), (-18.003945418, 0), (44.574649996, 0), align=None)
    extrus_o18 = extrude(amount=-EXTRUS_O18_DEPTH)

    # Espelhar10: Extrusão18 across plane
    add(extrus_o18.mirror(Plane(origin=(0, 0, 0), x_dir=(0, 0, 1), z_dir=(1, 0, 0))))

    # Esboço16 → Extrusão19 (cut)
    with BuildSketch(Plane.XZ):
        with Locations(Location((-12, 52, 0), (0, 0, 270))):
            Circle(ESBO_O16_R)
        with Locations(Location((12, 52, 0), (0, 0, 270))):
            Circle(ESBO_O16_R)
        with Locations(Location((-12, -47, 0), (0, 0, 270))):
            Circle(ESBO_O16_R)
        with Locations(Location((12, -47, 0), (0, 0, 270))):
            Circle(ESBO_O16_R)
    extrude(amount=-EXTRUS_O19_DEPTH, mode=Mode.SUBTRACT)


solid = part.part
